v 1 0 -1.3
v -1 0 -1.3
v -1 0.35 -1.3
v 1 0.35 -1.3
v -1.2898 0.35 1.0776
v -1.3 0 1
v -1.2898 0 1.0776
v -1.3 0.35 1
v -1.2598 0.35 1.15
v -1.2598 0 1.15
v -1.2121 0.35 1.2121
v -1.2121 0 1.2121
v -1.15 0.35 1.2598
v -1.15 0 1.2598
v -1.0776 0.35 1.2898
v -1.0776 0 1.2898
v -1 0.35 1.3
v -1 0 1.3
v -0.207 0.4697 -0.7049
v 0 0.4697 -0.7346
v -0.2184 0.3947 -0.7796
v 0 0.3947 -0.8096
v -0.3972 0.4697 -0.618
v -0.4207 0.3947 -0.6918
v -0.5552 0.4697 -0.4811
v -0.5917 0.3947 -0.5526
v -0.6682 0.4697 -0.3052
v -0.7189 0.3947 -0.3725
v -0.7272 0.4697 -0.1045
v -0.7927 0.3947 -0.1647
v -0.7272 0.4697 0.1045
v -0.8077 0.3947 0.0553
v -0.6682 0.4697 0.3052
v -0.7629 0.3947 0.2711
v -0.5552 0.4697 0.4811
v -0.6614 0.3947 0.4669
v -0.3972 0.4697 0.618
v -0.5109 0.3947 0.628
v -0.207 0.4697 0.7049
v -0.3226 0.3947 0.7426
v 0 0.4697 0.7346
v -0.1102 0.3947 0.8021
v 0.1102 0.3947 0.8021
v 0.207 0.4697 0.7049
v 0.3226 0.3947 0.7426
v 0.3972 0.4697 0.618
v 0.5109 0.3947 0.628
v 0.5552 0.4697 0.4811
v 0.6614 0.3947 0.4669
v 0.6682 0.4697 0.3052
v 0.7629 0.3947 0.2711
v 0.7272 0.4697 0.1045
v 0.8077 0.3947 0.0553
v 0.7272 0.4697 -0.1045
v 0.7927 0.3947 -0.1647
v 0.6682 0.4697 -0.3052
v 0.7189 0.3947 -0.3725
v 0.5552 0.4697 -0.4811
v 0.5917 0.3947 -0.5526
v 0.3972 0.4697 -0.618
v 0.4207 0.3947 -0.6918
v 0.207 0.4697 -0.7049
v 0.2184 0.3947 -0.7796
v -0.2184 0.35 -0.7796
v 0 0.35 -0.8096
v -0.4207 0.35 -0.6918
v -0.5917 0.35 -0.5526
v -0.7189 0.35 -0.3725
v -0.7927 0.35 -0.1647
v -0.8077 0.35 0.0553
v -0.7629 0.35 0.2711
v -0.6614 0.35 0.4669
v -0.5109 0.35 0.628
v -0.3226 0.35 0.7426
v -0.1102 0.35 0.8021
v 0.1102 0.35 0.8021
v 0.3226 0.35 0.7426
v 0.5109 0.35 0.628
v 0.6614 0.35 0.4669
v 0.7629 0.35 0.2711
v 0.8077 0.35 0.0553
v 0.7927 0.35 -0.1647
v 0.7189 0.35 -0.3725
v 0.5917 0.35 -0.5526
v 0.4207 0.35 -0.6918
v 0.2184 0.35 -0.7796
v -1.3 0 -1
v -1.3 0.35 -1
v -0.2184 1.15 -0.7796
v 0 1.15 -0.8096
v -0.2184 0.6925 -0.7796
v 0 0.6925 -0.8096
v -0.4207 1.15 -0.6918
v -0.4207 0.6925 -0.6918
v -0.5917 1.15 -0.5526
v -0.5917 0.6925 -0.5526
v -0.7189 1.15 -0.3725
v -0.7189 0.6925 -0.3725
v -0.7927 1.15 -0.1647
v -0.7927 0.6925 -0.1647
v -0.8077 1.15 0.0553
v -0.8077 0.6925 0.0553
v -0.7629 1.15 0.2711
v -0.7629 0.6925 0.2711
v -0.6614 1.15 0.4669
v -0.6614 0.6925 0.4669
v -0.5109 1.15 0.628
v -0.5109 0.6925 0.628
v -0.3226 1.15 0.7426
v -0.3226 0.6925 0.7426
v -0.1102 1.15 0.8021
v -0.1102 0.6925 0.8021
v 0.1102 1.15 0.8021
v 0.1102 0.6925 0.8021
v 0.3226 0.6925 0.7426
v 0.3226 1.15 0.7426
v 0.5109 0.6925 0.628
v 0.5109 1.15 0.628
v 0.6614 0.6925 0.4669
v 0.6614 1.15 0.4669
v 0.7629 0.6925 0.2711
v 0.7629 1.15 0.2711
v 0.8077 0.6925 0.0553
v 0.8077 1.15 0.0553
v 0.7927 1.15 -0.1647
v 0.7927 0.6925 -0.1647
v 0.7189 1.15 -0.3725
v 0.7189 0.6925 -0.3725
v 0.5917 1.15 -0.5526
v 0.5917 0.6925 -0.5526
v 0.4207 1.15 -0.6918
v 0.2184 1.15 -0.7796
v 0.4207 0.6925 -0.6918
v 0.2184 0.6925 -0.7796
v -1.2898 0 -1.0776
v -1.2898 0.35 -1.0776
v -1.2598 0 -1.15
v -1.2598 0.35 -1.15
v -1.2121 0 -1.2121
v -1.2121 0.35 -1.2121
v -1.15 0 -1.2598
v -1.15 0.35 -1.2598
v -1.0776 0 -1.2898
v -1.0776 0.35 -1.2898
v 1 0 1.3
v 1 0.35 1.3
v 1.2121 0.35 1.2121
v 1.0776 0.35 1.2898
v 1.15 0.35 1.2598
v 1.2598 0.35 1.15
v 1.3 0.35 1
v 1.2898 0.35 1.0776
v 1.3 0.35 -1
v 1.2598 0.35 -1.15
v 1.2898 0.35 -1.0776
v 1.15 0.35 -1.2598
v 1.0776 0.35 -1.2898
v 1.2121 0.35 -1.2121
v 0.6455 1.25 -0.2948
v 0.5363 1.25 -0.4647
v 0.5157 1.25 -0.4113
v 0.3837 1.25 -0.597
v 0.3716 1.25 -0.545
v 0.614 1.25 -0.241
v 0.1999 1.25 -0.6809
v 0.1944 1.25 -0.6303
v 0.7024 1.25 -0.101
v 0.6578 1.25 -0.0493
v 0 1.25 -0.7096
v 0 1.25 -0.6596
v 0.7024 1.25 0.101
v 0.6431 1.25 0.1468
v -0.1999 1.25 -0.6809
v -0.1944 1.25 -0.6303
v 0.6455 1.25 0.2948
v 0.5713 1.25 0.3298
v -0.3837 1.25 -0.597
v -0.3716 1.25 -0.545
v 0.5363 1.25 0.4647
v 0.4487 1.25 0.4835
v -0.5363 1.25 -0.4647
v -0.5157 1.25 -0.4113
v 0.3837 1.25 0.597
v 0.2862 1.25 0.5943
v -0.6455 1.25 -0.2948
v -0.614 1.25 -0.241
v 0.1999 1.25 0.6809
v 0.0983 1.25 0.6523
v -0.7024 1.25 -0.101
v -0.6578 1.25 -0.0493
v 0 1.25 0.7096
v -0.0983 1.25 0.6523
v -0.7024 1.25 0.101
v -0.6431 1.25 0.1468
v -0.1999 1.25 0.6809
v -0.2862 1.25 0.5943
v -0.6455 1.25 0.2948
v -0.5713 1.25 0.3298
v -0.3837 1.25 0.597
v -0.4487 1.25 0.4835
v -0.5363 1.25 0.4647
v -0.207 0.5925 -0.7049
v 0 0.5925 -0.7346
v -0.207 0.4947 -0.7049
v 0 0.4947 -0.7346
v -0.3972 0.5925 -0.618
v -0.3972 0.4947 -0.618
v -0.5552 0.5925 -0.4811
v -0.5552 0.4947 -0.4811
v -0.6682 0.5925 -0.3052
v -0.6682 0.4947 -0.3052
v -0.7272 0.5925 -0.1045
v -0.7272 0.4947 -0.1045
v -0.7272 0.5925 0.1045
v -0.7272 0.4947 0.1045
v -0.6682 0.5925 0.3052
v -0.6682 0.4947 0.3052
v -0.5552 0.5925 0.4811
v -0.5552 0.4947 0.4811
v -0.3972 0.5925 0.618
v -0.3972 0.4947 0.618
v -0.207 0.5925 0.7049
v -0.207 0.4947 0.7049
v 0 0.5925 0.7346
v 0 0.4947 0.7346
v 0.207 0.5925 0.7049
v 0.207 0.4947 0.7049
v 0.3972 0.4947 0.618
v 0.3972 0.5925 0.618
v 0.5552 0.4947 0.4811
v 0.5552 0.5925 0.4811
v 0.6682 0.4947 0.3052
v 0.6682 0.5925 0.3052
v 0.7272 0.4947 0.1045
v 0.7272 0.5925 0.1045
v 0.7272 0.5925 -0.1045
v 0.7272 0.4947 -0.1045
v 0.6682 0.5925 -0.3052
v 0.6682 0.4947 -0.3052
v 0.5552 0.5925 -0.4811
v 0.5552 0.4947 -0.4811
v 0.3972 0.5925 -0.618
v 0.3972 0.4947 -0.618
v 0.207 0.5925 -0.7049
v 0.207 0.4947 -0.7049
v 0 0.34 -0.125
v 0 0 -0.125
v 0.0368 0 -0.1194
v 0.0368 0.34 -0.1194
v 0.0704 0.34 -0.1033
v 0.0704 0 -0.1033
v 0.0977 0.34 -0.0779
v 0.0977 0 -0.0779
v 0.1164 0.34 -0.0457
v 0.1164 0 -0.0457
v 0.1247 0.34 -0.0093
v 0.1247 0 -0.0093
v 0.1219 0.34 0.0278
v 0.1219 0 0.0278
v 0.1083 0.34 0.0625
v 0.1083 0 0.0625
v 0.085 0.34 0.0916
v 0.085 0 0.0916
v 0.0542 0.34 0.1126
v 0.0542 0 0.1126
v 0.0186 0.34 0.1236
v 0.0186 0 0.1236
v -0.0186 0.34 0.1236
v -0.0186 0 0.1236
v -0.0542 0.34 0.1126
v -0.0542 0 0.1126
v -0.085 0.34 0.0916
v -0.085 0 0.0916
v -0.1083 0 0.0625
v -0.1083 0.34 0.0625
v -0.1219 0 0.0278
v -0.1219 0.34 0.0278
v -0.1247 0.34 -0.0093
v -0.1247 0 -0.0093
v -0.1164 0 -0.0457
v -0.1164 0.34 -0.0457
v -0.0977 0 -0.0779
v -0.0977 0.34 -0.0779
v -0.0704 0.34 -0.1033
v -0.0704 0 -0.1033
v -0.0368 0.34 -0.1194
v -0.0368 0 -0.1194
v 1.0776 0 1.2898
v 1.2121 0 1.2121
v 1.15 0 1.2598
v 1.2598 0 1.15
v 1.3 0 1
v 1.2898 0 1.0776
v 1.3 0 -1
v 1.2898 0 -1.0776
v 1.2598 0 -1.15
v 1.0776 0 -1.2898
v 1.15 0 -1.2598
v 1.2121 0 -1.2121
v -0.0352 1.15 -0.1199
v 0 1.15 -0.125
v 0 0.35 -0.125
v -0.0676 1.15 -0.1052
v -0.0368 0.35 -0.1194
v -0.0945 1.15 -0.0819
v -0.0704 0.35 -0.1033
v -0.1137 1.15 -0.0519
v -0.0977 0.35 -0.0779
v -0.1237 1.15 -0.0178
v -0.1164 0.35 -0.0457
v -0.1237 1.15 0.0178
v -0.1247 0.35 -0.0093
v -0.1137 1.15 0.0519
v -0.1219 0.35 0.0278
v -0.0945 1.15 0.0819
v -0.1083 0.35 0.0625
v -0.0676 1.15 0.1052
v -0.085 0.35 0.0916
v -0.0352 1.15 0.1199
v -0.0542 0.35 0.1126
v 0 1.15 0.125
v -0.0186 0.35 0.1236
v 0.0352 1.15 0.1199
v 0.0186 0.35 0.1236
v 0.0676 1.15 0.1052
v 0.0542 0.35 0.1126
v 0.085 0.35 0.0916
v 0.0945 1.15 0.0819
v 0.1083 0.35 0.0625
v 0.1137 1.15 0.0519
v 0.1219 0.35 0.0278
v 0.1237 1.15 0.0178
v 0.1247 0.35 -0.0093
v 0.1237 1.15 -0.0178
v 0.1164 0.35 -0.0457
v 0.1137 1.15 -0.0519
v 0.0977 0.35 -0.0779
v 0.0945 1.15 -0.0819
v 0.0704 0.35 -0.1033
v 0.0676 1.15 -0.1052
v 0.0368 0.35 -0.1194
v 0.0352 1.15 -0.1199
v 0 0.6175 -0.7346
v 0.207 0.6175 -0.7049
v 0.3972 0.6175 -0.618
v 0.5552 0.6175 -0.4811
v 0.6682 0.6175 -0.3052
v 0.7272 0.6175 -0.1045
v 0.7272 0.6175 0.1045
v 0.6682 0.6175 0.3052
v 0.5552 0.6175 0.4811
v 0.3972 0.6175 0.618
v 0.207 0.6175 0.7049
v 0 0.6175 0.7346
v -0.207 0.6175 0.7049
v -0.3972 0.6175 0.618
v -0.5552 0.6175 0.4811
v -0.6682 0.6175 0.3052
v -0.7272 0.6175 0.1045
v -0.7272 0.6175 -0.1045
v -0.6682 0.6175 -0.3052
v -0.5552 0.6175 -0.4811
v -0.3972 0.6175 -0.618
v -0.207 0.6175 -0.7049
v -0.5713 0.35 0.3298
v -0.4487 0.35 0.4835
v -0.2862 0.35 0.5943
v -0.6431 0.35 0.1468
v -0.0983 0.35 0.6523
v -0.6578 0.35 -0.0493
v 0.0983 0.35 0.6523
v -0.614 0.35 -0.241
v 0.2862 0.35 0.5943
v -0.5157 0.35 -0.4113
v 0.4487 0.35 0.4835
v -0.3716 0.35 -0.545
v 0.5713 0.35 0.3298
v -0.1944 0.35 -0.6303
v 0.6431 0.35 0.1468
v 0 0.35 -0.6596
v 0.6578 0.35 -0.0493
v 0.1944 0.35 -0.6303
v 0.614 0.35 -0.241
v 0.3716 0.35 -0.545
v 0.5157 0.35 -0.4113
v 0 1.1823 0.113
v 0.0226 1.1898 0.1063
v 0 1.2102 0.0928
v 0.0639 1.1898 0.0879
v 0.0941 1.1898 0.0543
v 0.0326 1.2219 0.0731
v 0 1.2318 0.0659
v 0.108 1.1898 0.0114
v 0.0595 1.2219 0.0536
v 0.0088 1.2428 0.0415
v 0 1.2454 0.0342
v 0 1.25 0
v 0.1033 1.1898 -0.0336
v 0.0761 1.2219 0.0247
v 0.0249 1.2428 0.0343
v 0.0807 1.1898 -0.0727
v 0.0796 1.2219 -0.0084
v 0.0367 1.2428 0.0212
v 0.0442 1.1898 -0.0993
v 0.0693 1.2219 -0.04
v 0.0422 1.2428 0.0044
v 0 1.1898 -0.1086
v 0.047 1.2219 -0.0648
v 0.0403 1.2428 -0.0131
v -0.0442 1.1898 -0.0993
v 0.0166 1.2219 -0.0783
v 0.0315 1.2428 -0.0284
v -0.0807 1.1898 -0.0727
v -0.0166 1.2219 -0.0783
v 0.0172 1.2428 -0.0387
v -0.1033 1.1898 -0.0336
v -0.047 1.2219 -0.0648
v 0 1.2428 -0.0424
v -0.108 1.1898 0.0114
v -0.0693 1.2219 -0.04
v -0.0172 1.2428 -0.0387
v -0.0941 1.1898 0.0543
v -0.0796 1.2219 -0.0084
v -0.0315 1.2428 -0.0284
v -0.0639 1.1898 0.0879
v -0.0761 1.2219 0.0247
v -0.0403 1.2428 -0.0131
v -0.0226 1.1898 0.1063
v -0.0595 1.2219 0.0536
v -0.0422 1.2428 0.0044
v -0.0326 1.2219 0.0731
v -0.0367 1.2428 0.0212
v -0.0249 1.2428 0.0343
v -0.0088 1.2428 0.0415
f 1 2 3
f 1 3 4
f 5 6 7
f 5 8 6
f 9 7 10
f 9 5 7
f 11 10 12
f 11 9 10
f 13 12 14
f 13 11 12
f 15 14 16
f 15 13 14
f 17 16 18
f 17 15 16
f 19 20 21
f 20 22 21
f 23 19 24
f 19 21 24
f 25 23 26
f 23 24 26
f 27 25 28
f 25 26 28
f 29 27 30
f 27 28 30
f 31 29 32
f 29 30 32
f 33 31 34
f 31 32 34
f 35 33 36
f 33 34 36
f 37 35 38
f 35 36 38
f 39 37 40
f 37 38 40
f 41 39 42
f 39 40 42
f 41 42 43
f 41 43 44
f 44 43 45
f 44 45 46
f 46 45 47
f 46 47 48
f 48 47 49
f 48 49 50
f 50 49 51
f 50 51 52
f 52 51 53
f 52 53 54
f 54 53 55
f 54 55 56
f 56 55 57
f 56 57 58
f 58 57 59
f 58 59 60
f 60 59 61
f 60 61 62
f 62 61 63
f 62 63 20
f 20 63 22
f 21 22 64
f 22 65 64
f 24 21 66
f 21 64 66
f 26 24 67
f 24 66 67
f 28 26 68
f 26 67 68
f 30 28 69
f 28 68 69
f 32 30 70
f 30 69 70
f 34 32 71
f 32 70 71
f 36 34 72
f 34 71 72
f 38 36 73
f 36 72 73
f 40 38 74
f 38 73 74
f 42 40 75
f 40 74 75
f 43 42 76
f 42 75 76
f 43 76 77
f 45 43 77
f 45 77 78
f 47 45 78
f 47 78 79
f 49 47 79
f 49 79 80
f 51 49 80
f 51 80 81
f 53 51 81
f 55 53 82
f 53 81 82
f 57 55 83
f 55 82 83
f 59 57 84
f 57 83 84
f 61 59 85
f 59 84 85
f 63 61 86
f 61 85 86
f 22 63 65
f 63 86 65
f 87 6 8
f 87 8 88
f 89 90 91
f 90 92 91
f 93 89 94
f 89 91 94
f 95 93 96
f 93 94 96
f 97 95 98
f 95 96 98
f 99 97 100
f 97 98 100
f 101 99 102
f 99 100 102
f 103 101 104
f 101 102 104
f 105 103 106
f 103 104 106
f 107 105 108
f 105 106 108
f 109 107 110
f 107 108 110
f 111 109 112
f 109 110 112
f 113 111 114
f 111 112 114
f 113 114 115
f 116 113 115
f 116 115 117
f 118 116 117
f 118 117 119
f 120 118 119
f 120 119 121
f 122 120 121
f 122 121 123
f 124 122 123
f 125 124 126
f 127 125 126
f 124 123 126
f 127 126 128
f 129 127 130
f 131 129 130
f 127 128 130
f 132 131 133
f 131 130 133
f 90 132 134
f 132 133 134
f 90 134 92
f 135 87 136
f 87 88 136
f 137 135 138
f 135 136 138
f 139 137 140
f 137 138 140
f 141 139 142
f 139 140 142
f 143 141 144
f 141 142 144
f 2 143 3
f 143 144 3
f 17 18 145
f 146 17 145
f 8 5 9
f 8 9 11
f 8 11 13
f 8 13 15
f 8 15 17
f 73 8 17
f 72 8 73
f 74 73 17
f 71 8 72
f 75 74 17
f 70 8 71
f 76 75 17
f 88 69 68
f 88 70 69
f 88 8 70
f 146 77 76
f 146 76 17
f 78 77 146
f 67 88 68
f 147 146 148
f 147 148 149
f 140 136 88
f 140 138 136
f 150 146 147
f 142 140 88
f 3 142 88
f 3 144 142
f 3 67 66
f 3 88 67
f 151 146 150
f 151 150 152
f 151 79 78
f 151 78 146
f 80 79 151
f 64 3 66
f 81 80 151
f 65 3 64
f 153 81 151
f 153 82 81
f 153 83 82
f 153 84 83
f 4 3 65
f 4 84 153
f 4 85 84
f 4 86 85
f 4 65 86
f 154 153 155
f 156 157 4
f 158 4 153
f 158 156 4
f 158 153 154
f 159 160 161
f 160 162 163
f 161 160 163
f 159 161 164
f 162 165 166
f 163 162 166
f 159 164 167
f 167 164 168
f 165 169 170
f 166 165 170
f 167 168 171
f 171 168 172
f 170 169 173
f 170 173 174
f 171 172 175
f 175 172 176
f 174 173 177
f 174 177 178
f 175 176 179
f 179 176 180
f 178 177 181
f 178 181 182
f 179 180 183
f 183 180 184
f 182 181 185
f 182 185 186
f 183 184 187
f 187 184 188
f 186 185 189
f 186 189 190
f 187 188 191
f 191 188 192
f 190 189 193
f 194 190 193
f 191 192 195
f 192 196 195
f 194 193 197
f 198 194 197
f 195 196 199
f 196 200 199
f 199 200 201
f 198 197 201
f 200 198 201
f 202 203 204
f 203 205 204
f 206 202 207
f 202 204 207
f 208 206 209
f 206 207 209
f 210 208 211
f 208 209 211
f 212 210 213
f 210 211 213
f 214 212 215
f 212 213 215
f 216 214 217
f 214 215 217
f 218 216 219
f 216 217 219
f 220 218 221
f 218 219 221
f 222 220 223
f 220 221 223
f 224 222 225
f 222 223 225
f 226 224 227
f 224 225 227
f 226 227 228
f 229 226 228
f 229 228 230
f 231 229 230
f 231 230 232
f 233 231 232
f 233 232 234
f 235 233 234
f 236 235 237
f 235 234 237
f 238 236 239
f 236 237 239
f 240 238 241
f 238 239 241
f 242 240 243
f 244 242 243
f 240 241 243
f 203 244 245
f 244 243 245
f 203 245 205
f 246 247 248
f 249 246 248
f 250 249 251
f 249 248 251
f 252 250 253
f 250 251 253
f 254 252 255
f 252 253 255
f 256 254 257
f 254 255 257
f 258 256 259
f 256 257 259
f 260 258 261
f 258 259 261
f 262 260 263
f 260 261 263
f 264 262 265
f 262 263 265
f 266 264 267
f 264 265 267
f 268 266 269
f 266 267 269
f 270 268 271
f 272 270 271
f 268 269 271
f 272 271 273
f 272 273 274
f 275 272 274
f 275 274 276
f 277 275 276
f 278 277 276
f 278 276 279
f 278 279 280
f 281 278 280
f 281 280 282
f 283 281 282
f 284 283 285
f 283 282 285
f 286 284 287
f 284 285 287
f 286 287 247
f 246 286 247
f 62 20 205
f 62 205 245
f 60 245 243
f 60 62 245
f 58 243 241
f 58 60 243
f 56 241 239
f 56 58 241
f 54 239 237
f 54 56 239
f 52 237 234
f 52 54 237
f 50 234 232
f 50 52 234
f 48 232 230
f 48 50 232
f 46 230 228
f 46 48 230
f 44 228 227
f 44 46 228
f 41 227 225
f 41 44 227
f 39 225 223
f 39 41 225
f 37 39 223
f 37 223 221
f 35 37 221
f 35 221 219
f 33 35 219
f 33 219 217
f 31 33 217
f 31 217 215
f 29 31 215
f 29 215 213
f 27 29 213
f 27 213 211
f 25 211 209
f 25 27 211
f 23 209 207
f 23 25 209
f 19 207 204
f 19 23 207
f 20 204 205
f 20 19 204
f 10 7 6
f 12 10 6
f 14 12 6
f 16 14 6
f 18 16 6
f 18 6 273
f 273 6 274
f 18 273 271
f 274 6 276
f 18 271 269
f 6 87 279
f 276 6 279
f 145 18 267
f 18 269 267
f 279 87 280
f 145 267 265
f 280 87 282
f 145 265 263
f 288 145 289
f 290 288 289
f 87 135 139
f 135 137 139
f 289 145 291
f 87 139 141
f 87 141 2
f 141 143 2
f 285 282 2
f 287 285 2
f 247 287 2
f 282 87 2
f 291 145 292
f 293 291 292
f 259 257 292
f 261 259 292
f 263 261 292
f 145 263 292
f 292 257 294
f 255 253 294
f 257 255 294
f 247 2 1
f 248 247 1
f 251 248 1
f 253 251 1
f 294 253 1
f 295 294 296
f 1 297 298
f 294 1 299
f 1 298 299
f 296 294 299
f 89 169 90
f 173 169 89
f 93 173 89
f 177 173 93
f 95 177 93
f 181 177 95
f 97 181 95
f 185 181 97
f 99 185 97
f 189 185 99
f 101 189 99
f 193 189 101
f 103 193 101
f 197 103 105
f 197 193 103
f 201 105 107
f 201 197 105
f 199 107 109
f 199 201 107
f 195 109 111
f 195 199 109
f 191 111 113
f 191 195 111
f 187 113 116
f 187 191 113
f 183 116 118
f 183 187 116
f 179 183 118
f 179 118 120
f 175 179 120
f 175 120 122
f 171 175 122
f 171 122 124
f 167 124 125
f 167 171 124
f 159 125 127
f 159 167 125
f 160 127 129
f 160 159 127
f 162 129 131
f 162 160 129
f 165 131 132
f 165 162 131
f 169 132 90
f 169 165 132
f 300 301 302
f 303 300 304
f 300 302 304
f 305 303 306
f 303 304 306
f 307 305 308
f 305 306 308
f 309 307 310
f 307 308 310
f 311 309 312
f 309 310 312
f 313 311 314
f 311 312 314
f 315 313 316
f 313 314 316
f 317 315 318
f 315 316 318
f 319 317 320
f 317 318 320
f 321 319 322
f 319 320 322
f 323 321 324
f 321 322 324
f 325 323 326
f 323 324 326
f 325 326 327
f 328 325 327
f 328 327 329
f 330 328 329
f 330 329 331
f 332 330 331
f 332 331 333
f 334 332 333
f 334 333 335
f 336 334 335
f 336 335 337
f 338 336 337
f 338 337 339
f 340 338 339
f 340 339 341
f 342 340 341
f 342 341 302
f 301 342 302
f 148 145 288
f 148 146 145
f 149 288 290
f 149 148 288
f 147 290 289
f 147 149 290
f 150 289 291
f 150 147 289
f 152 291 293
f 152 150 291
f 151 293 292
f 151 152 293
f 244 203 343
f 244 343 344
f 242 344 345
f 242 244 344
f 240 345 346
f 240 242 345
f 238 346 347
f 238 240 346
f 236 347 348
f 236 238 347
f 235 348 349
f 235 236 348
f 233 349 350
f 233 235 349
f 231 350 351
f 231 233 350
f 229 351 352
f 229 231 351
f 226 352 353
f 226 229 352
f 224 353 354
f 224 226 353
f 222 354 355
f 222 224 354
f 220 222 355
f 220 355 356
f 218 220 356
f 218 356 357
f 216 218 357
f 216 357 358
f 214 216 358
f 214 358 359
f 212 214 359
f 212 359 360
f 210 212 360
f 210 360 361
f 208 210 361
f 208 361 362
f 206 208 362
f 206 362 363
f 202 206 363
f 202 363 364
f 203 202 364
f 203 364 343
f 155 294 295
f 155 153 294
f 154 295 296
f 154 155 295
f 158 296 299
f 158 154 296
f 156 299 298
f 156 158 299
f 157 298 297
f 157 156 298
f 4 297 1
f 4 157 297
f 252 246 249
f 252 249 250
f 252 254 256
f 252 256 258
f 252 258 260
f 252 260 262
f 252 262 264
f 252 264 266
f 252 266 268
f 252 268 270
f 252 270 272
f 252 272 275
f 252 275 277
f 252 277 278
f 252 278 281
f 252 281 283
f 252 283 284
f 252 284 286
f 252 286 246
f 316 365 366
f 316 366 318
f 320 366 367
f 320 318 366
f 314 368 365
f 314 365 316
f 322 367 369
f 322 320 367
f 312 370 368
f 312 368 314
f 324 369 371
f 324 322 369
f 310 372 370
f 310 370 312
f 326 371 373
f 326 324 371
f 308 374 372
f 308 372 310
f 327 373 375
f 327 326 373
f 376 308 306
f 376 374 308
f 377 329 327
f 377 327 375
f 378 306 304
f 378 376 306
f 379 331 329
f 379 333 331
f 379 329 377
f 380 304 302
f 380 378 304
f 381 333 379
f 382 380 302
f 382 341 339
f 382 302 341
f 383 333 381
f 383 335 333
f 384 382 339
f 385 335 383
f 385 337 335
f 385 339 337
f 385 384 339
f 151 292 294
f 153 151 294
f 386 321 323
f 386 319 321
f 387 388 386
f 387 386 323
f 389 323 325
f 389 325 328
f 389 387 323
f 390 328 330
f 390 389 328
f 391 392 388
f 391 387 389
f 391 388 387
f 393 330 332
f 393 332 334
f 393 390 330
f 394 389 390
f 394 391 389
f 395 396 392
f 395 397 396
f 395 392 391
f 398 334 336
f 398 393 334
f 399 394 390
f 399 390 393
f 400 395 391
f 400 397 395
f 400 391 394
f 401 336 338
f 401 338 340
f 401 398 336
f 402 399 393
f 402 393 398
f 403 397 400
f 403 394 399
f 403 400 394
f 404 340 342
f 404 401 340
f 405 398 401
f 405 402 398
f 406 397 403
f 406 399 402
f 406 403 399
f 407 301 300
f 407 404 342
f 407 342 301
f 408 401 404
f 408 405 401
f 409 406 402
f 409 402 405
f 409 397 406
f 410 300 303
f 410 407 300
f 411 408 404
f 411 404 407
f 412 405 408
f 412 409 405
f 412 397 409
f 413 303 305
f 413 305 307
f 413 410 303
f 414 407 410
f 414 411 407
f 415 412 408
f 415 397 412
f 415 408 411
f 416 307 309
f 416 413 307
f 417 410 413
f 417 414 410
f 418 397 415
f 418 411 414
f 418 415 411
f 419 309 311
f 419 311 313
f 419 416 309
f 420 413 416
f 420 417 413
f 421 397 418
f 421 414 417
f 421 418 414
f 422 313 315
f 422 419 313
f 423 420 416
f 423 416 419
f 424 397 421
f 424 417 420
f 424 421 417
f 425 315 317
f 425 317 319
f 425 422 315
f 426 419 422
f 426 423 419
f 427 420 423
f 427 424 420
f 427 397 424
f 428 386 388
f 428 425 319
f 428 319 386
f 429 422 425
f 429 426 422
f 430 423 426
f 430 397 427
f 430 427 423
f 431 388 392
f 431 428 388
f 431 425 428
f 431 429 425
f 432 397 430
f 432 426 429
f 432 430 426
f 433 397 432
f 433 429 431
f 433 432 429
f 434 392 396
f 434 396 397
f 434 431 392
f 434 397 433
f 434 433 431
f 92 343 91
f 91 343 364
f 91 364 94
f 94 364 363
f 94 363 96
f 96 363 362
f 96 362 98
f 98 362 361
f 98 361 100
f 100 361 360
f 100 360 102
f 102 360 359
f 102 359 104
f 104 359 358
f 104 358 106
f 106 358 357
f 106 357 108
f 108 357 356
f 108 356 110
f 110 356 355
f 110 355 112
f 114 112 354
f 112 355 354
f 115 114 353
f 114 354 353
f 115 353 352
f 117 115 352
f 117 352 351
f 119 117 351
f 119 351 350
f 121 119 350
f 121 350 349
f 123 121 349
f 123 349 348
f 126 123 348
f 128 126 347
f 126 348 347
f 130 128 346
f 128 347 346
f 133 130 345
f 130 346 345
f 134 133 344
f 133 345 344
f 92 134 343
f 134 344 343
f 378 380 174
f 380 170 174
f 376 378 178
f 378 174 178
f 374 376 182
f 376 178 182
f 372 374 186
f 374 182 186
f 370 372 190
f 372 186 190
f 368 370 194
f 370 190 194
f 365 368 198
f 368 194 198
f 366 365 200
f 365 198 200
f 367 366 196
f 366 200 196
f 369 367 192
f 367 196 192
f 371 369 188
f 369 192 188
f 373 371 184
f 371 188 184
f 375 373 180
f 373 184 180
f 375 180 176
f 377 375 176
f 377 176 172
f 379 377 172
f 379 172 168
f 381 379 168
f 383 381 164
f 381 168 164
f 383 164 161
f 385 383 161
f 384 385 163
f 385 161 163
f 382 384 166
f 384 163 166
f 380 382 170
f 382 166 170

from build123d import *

# Parameters (mm, degrees)
SKETCH1_W           = 2.6
SKETCH1_H           = 2.6
BOSS_EXTRUDE1_DEPTH = 0.35
FILLET1_R           = 0.3
CHAMFER1_SIZE       = 0.1
CHAMFER2_SIZE       = 0.1
SKETCH4_R           = 0.125
BOSS_EXTRUDE2_DEPTH = 0.8
DOME1_FACE_RADIUS   = 0.125
DOME1_HEIGHT        = 0.1
SKETCH5_R           = 0.125
CUT_EXTRUDE2_DEPTH  = 0.34


with BuildPart() as part:
    # Sketch1 → Boss-Extrude1 (new body)
    with BuildSketch(Plane(origin=(0, 0, 0), x_dir=(1, 0, 0), z_dir=(0, 1, 0))):
        Rectangle(SKETCH1_W, SKETCH1_H)
    extrude(amount=BOSS_EXTRUDE1_DEPTH)

    # Fillet1
    fillet1_edges = [part.edges().sort_by_distance(p)[0] for p in [
        (1.3, 0.175, 1.3),
        (-1.3, 0.175, 1.3),
        (-1.3, 0.175, -1.3),
        (1.3, 0.175, -1.3),
    ]]
    fillet(fillet1_edges, radius=FILLET1_R)

    # Sketch3 → Revolve1 (revolve)
    with BuildSketch(Plane.XY, mode=Mode.PRIVATE) as revolve1_sk:
        Polygon((0.659628487, 0.35), (0.659628487, 1.25), (0.809628487, 1.25), (0.809628487, 0.592524264), (0.734628487, 0.592524264), (0.734628487, 0.494723207), (0.809628487, 0.494723207), (0.809628487, 0.35), align=None)
    revolve(revolve1_sk.sketch.rotate(Axis((0, -50, 0), (0, 1, 0)), 90), axis=Axis((0, -50, 0), (0, 1, 0)))

    # Chamfer1
    chamfer1_edges = [part.edges().sort_by_distance(p)[0] for p in [
        (0, 1.25, 0.809628487),
    ]]
    chamfer(chamfer1_edges, length=CHAMFER1_SIZE)

    # Chamfer2
    # the kernel refuses this chamfer: 0.1 mm, written as the material it takes off along each edge
    with BuildSketch(Plane(origin=(0, 0.494723207, 0), x_dir=(0, 0, -1), z_dir=(1, 0, 0))) as chamfer2_piece_1_section:
        Polygon((0.809628487 - CHAMFER2_SIZE, 0), (0.809628487, -CHAMFER2_SIZE), (0.809628487, 0), align=None)
    chamfer2_piece_1 = revolve(axis=Axis((0, 0.494723207, 0), (0, 1, 0)), mode=Mode.PRIVATE)
    chamfer2_piece_1 = chamfer2_piece_1 - Plane(origin=(0, 0.43287552, 0), x_dir=(0, 0, -1), z_dir=(0, -1, 0)) * Cylinder(0.734628487, 4, mode=Mode.PRIVATE)
    add(chamfer2_piece_1, mode=Mode.SUBTRACT)
    with BuildSketch(Plane(origin=(0, 0.592524264, 0), x_dir=(0, 0, -1), z_dir=(1, 0, 0))) as chamfer2_piece_2_section:
        Polygon((0.809628487, CHAMFER2_SIZE), (0.809628487 - CHAMFER2_SIZE, 0), (0.809628487, 0), align=None)
    chamfer2_piece_2 = revolve(axis=Axis((0, 0.592524264, 0), (0, 1, 0)), mode=Mode.PRIVATE)
    chamfer2_piece_2 = chamfer2_piece_2 - Plane(origin=(0, 0.65437195, 0), x_dir=(0, 0, -1), z_dir=(0, -1, 0)) * Cylinder(0.734628487, 4, mode=Mode.PRIVATE)
    add(chamfer2_piece_2, mode=Mode.SUBTRACT)

    # Sketch4 → Boss-Extrude2 (add)
    with BuildSketch(Plane(origin=(0, 0.35, 0), x_dir=(1, 0, 0), z_dir=(0, 1, 0))):
        with Locations(Location((0, 0, 0), (0, 0, 90))):
            Circle(SKETCH4_R)
    extrude(amount=BOSS_EXTRUDE2_DEPTH)

    # Dome1: a dome of height H over a round flat face of radius A is a cap of a sphere of radius (A * A + H * H) / (2 * H)
    dome1_r = (DOME1_FACE_RADIUS * DOME1_FACE_RADIUS + DOME1_HEIGHT * DOME1_HEIGHT) / (2 * DOME1_HEIGHT)
    dome1_base = Plane((0, 1.15, 0), z_dir=(0, 1, 0))
    with Locations(dome1_base.offset(DOME1_HEIGHT - dome1_r)):
        dome1_ball = Sphere(dome1_r, mode=Mode.PRIVATE)
    add(split(dome1_ball, bisect_by=dome1_base, keep=Keep.TOP, mode=Mode.PRIVATE))

    # Sketch5 → Cut-Extrude2 (cut)
    with BuildSketch(Plane.XZ):
        with Locations(Location((0, 0, 0), (0, 0, 270))):
            Circle(SKETCH5_R)
    extrude(amount=-CUT_EXTRUDE2_DEPTH, mode=Mode.SUBTRACT)


solid = part.part
